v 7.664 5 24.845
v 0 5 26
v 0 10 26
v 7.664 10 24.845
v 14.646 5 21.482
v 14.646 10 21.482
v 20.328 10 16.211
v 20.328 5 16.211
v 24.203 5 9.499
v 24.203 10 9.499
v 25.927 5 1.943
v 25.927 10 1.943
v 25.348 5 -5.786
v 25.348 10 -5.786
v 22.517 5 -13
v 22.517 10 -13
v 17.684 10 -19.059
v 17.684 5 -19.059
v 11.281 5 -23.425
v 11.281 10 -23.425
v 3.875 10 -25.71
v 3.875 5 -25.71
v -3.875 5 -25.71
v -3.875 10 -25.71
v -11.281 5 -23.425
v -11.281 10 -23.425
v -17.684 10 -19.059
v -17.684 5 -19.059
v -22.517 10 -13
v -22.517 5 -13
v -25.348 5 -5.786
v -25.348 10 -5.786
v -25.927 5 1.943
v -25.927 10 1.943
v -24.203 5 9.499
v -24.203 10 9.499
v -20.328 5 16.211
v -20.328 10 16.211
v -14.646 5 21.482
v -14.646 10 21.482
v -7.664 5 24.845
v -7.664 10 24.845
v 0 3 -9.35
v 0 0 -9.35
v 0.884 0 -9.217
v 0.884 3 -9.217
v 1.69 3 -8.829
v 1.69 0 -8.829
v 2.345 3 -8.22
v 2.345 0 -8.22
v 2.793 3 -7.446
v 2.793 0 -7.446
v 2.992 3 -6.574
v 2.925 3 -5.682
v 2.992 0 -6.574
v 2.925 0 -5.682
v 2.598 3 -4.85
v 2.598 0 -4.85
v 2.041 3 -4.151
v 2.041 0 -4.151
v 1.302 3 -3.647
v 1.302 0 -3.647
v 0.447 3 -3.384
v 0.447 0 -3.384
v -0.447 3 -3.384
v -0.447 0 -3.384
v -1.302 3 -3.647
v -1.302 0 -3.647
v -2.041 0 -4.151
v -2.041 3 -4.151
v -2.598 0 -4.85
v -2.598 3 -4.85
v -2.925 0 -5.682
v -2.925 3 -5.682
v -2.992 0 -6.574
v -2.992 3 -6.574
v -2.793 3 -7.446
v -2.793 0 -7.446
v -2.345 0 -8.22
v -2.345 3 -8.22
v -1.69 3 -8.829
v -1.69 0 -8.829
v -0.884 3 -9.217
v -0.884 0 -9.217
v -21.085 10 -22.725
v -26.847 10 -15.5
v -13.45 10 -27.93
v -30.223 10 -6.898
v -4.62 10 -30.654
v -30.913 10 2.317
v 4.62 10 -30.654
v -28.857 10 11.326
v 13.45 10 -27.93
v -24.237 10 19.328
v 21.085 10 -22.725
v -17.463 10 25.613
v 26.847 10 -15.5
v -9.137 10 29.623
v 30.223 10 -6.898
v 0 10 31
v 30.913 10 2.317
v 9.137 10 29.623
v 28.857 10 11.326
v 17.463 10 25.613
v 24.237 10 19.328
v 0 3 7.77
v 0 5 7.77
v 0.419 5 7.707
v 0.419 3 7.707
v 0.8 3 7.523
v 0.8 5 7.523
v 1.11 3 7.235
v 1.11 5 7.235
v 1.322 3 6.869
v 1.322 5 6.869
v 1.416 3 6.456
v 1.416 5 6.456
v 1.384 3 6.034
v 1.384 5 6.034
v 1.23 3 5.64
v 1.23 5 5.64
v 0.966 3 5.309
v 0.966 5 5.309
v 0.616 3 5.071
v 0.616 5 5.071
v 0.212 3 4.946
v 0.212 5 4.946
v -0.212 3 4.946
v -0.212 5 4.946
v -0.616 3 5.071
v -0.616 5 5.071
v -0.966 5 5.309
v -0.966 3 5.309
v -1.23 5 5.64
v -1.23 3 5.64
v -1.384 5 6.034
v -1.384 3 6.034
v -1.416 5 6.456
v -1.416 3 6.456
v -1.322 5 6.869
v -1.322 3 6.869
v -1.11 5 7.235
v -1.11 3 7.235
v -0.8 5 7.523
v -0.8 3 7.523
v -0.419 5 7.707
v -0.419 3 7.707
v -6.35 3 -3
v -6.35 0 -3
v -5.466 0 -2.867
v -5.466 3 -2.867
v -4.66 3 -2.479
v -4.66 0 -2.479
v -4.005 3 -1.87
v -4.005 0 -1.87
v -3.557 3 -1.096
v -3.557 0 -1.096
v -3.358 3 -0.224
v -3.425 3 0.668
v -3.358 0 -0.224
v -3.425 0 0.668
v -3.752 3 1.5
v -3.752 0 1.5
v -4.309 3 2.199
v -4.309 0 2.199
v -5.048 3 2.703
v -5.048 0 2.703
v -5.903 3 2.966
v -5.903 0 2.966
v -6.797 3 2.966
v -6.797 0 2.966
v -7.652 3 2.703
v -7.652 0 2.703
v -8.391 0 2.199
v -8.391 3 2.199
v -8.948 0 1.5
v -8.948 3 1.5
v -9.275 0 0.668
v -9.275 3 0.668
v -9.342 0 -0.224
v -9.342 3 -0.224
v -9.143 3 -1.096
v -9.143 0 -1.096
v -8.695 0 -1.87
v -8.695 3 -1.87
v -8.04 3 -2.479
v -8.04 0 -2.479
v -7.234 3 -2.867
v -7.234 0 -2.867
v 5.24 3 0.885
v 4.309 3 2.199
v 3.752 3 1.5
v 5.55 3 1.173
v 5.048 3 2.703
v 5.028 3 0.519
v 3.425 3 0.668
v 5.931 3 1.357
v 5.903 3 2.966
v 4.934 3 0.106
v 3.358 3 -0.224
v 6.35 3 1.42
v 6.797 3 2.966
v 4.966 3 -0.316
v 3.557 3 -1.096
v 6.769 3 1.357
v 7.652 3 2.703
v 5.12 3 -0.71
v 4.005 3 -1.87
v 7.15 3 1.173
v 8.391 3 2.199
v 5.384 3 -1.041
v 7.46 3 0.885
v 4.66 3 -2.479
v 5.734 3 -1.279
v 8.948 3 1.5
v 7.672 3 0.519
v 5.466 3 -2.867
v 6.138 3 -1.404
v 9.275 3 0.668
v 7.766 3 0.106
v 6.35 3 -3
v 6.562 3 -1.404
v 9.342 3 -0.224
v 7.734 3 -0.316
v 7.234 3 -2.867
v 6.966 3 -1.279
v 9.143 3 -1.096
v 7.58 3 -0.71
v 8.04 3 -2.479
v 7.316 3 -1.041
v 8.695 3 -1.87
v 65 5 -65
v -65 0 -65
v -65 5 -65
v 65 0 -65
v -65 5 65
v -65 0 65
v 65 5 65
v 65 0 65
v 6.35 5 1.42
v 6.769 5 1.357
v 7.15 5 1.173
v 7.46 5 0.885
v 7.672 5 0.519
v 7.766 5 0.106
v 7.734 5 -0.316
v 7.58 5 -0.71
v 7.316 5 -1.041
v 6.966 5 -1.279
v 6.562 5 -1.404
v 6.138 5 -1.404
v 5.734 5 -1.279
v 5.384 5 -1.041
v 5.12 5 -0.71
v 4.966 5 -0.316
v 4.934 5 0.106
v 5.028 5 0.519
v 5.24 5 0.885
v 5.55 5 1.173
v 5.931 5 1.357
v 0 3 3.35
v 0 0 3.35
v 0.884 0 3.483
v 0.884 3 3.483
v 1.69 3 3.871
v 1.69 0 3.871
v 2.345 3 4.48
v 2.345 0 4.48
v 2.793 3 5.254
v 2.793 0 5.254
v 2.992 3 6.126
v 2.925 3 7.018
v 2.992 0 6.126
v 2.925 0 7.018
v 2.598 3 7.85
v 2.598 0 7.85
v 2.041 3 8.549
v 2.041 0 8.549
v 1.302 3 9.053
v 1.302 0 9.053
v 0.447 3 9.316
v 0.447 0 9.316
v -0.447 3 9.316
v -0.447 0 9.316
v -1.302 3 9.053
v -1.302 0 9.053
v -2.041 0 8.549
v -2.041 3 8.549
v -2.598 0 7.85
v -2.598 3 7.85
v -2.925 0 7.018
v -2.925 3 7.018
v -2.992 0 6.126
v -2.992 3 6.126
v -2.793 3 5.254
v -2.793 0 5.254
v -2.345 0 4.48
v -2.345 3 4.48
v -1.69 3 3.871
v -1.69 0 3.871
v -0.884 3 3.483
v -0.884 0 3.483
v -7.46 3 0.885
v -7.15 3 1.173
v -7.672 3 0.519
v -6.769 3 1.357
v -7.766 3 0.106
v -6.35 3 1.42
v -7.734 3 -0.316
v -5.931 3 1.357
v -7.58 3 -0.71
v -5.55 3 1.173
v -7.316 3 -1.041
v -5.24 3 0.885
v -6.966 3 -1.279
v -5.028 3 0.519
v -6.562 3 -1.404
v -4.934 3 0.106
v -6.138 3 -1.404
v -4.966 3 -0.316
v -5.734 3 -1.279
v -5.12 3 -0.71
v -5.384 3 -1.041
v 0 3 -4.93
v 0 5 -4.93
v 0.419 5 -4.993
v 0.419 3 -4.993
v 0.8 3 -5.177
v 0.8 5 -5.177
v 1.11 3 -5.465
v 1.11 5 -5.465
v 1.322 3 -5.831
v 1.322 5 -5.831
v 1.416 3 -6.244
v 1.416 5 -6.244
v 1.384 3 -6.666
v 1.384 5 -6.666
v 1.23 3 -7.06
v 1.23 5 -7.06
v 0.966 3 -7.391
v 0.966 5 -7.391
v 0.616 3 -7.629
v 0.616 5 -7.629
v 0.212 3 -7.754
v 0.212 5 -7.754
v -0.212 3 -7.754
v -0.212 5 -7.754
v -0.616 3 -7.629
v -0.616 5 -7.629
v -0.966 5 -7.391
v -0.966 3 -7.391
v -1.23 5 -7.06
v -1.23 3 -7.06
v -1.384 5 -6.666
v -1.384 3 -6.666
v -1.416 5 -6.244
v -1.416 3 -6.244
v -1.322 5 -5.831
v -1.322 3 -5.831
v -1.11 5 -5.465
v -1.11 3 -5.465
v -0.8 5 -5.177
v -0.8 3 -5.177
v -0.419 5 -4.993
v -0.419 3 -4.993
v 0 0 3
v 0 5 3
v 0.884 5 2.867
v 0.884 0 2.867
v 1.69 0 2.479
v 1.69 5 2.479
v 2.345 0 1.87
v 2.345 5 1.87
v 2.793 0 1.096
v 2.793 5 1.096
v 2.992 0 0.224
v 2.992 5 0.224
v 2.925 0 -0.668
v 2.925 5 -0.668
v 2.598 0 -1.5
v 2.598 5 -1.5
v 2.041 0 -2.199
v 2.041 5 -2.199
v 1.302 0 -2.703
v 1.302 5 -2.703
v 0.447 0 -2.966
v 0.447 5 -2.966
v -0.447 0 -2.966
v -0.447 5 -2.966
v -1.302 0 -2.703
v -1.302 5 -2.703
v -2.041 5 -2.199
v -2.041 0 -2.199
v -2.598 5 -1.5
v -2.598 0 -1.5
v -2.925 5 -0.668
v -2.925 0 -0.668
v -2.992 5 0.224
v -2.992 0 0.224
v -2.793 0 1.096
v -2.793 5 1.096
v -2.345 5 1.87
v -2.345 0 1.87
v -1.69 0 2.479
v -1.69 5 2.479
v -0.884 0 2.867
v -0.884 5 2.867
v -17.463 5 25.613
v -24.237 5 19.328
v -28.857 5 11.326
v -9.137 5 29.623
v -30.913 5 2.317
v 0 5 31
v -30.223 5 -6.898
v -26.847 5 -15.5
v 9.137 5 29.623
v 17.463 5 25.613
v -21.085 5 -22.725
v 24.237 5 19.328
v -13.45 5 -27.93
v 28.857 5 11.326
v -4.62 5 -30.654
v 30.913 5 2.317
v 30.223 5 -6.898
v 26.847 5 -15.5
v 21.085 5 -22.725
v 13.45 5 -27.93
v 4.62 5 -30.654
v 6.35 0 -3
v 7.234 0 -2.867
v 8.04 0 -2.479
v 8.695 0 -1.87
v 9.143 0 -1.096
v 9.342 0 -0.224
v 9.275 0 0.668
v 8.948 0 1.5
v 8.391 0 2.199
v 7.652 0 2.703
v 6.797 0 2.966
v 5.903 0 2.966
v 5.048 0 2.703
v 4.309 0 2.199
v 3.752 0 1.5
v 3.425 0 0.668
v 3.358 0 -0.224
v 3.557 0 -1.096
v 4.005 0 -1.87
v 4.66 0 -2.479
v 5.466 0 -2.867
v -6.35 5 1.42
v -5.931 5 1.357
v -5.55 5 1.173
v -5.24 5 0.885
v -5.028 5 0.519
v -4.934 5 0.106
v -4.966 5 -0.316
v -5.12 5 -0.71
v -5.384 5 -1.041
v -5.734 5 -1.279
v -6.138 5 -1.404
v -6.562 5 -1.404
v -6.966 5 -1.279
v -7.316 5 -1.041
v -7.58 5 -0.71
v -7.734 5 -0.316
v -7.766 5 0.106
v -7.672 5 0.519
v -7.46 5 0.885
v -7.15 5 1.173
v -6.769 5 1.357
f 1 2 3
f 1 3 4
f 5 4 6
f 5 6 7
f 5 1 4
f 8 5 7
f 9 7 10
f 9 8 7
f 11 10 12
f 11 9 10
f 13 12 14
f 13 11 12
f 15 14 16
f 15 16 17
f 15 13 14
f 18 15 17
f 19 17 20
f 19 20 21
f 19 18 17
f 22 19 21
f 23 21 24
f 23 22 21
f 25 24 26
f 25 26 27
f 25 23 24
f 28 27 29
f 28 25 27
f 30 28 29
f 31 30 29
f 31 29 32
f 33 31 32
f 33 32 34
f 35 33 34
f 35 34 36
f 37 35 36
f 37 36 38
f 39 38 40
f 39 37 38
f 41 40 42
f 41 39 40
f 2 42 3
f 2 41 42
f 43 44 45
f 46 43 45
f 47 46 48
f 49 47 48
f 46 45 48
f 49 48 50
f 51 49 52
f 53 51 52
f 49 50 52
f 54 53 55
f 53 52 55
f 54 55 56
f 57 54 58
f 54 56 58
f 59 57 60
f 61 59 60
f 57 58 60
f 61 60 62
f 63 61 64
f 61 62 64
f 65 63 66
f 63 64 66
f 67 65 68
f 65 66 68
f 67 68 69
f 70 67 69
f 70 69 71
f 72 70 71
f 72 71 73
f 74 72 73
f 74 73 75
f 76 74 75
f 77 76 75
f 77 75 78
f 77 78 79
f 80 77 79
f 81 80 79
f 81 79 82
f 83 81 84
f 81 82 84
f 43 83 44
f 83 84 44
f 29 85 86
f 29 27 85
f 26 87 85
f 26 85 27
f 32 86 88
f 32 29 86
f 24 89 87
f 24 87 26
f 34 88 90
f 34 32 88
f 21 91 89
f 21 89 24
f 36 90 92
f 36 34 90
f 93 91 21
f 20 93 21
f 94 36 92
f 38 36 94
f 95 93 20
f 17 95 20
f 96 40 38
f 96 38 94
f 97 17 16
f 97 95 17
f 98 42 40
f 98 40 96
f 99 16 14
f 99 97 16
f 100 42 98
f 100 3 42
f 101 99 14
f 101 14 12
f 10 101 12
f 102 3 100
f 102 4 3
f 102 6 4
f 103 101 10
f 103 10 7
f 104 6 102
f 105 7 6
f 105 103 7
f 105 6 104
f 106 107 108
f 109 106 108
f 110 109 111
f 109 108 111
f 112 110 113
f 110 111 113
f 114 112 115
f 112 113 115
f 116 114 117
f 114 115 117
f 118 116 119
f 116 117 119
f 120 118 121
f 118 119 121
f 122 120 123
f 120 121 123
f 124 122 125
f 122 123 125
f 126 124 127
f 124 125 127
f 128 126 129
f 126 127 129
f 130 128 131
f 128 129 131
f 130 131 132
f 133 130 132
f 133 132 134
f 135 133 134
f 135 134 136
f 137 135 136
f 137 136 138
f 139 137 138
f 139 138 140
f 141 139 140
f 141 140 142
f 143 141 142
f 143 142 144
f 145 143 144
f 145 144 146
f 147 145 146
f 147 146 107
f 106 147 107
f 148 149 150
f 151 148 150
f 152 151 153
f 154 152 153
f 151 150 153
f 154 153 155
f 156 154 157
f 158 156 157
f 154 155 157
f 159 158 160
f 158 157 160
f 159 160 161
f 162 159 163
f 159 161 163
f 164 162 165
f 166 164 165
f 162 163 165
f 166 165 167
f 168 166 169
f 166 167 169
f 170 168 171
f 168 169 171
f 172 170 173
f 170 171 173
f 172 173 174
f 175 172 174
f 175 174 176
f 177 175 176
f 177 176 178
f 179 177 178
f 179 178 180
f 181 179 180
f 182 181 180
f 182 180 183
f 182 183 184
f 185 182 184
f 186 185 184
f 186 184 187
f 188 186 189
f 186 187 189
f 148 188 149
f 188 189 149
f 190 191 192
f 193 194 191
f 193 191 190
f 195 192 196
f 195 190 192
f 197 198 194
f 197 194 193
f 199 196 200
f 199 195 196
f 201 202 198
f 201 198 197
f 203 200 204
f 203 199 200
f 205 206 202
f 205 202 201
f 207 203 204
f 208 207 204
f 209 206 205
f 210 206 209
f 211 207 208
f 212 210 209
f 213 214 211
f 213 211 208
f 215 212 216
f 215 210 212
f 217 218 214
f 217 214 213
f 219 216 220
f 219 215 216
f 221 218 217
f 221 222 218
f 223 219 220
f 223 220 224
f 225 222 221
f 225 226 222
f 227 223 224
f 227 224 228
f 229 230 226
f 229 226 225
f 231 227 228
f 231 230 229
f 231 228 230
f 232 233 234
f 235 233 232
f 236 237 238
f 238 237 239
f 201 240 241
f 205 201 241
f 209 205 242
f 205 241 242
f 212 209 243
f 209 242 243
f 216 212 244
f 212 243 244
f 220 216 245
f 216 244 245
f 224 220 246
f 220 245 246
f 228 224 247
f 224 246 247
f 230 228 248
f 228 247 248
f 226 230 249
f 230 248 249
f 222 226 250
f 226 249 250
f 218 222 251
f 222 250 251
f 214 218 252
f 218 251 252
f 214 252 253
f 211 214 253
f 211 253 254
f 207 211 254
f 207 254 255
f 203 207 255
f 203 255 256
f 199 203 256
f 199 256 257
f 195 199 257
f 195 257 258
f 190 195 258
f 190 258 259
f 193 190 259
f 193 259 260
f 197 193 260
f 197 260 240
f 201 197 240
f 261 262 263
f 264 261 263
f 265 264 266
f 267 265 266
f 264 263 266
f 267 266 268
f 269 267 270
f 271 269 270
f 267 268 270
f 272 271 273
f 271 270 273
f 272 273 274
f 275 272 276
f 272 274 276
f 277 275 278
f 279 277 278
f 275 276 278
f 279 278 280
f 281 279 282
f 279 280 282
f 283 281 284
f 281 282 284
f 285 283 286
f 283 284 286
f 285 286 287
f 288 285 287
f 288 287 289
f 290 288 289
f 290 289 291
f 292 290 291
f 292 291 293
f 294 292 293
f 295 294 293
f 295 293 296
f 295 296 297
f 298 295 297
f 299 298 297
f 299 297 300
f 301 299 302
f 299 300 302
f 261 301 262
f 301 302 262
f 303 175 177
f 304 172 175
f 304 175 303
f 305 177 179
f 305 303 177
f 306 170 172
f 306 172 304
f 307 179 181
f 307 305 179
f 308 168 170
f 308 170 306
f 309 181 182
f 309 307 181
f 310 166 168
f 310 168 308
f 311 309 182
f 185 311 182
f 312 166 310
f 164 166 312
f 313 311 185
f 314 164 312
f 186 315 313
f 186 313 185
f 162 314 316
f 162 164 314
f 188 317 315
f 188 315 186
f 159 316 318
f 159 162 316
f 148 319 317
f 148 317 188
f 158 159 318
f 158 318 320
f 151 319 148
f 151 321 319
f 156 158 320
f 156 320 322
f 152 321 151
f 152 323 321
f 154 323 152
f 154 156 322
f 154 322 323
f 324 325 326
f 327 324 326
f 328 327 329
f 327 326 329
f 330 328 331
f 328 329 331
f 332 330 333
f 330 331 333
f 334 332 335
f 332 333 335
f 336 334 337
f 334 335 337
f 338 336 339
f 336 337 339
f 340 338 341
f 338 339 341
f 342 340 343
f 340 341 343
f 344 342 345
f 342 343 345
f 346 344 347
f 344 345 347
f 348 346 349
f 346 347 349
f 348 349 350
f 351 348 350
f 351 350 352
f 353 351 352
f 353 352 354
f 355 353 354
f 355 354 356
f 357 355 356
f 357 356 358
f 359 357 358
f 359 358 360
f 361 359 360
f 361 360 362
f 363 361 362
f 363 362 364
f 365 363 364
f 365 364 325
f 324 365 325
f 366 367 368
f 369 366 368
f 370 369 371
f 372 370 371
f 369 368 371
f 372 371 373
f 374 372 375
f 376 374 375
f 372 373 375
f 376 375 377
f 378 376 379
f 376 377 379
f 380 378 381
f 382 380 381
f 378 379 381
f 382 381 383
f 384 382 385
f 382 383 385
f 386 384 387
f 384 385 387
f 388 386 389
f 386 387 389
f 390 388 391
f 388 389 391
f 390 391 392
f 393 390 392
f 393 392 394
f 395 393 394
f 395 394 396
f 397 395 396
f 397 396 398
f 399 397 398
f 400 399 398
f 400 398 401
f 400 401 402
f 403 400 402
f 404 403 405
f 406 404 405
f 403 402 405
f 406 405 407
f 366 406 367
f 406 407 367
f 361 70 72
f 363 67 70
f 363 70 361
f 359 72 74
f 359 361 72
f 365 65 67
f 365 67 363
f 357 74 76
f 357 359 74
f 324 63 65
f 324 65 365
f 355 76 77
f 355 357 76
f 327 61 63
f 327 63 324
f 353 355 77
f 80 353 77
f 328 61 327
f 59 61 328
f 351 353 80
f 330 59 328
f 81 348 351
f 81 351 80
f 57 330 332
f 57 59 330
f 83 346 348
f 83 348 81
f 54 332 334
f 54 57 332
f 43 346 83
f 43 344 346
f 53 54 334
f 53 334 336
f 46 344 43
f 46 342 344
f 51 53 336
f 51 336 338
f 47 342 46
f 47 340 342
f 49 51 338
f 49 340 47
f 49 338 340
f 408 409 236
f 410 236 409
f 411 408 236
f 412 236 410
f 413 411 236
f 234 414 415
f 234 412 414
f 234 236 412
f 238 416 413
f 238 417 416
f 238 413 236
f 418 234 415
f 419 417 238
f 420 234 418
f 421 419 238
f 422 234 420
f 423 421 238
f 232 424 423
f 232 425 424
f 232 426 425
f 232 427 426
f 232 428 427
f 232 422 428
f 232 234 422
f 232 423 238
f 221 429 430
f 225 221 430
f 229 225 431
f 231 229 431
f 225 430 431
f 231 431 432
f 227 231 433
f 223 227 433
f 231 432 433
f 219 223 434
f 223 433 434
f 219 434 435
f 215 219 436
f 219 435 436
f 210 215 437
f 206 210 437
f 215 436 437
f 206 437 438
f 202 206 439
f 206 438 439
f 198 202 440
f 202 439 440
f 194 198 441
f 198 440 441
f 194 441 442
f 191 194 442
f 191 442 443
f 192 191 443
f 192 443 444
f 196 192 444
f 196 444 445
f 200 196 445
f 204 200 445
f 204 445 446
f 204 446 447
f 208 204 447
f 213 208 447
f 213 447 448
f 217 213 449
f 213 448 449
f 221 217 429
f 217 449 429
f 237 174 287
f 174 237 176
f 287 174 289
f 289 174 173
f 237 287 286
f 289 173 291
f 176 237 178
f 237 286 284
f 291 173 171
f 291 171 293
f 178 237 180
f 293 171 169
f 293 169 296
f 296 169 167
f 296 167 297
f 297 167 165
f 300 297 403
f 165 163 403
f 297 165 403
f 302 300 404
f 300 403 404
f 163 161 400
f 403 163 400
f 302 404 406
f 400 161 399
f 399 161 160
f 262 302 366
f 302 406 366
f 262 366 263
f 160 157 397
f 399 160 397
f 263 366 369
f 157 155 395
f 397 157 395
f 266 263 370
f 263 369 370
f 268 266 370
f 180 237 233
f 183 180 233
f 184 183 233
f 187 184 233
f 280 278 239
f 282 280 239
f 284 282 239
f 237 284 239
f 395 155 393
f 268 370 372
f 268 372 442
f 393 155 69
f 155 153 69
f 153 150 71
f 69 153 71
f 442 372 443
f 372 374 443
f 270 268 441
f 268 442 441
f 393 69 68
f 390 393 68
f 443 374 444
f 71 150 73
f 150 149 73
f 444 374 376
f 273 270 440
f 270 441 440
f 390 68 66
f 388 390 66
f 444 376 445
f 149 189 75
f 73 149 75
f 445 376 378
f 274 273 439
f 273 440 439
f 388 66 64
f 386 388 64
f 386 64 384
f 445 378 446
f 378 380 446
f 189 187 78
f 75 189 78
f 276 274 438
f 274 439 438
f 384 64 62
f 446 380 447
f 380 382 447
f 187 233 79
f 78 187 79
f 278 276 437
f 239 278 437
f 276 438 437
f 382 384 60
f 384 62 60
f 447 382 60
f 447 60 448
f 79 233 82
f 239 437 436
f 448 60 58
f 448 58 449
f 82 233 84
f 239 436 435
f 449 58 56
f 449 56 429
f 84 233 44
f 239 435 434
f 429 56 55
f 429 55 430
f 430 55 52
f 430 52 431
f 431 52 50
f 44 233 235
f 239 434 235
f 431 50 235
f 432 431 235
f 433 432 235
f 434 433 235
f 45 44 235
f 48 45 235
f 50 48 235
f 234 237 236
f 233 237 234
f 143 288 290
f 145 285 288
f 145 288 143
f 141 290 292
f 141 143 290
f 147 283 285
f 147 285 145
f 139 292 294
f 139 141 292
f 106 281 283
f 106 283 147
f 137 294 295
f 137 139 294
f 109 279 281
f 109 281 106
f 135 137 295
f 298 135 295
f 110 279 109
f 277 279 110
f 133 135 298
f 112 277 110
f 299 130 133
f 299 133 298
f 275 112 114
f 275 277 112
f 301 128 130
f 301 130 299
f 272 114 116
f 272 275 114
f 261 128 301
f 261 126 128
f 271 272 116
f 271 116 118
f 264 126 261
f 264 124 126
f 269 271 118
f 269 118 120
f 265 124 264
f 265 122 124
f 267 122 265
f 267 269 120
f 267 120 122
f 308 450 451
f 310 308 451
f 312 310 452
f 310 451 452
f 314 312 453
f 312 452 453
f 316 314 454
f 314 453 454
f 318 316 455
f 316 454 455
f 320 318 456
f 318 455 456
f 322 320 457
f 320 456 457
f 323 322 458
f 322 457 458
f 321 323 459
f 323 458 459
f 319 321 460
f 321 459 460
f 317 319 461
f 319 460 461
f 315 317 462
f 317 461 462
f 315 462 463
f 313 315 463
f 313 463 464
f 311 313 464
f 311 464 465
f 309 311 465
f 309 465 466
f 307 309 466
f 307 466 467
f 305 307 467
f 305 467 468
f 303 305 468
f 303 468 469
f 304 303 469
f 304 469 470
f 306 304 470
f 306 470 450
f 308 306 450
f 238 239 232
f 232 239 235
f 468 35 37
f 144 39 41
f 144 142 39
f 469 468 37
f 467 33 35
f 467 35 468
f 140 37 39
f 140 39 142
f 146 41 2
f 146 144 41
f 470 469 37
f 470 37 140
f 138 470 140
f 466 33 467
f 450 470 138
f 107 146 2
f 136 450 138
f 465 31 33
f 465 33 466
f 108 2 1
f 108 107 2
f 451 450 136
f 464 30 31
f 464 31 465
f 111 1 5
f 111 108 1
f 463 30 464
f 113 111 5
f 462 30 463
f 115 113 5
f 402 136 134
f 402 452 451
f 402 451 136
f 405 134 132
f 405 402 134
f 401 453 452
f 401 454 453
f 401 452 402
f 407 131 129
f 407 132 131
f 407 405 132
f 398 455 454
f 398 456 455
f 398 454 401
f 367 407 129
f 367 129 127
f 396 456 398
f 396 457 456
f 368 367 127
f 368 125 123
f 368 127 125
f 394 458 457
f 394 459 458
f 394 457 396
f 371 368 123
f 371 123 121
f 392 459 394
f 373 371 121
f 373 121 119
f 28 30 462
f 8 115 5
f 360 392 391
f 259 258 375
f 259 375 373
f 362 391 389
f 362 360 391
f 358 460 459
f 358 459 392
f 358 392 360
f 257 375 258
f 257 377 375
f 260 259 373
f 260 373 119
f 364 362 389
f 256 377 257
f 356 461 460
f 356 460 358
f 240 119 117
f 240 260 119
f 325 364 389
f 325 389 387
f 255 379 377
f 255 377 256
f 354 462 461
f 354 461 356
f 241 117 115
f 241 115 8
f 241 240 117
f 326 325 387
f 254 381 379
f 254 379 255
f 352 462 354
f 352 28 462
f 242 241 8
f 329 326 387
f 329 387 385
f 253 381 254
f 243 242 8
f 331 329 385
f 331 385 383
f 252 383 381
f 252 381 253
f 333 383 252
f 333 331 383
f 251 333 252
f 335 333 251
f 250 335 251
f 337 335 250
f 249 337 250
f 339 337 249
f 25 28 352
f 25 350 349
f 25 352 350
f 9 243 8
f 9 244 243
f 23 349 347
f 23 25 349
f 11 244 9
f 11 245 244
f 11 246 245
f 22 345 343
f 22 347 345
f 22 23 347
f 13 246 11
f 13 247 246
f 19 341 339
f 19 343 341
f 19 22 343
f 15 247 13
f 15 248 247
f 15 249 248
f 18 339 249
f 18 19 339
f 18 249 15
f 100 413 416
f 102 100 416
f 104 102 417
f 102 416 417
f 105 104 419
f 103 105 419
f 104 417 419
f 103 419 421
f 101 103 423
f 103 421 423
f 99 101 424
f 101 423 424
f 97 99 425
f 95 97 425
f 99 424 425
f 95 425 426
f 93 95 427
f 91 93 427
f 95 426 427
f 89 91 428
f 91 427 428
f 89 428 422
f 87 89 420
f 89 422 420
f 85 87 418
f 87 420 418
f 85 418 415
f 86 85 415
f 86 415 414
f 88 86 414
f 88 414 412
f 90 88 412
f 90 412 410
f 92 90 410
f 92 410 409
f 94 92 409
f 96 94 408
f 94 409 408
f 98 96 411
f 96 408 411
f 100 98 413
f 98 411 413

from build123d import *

# Parameters (mm, degrees)
SKETCH1_W           = 130
SKETCH1_H           = 130
SKETCH1_R           = 31
SKETCH1_R_2         = 26
SKETCH1_R_3         = 24
BOSS_EXTRUDE2_DEPTH = 5
SKETCH2_R           = 31
SKETCH2_R_2         = 26
BOSS_EXTRUDE3_DEPTH = 5
SKETCH3_R           = 1.42
SKETCH3_R_2         = 3
CUT_EXTRUDE1_DEPTH  = 5
SKETCH4_R           = 3
CUT_EXTRUDE2_DEPTH  = 3


with BuildPart() as part:
    # Sketch1 → Boss-Extrude2 (new body)
    # profile 1 of 4: a face of its own
    with BuildSketch(Plane(origin=(0, 0, 0), x_dir=(1, 0, 0), z_dir=(0, 1, 0))):
        Rectangle(SKETCH1_W, SKETCH1_H)
        Circle(SKETCH1_R, mode=Mode.SUBTRACT)
    # profile 2 of 4: a face of its own
    with BuildSketch(Plane(origin=(0, 0, 0), x_dir=(1, 0, 0), z_dir=(0, 1, 0))):
        Circle(SKETCH1_R)
        Circle(SKETCH1_R_2, mode=Mode.SUBTRACT)
    # profile 3 of 4: a face of its own
    with BuildSketch(Plane(origin=(0, 0, 0), x_dir=(1, 0, 0), z_dir=(0, 1, 0))):
        Circle(SKETCH1_R_2)
        Circle(SKETCH1_R_3, mode=Mode.SUBTRACT)
    # profile 4 of 4: a face of its own
    with BuildSketch(Plane(origin=(0, 0, 0), x_dir=(1, 0, 0), z_dir=(0, 1, 0))):
        Circle(SKETCH1_R_3)
    extrude(amount=BOSS_EXTRUDE2_DEPTH)

    # Sketch2 → Boss-Extrude3 (add)
    with BuildSketch(Plane(origin=(0, 5, 0), x_dir=(1, 0, 0), z_dir=(0, 1, 0))):
        with Locations(Location((0, 0, 0), (0, 0, 270))):
            Circle(SKETCH2_R)
        with Locations(Location((0, 0, 0), (0, 0, 270))):
            Circle(SKETCH2_R_2, mode=Mode.SUBTRACT)
    extrude(amount=BOSS_EXTRUDE3_DEPTH)

    # Sketch3 → Cut-Extrude1 (cut)
    with BuildSketch(Plane(origin=(0, 5, 0), x_dir=(1, 0, 0), z_dir=(0, 1, 0))):
        with Locations(Location((0, 6.35, 0), (0, 0, 270))):
            Circle(SKETCH3_R)
        with Locations(Location((6.35, 0, 0), (0, 0, 270))):
            Circle(SKETCH3_R)
        with Locations(Location((0, -6.35, 0), (0, 0, 270))):
            Circle(SKETCH3_R)
        with Locations(Location((-6.35, 0, 0), (0, 0, 270))):
            Circle(SKETCH3_R)
        with Locations(Location((0, 0, 0), (0, 0, 270))):
            Circle(SKETCH3_R_2)
    extrude(amount=-CUT_EXTRUDE1_DEPTH, mode=Mode.SUBTRACT)

    # Sketch4 → Cut-Extrude2 (cut)
    with BuildSketch(Plane(origin=(0, 0, 0), x_dir=(-1, 0, 0), z_dir=(0, -1, 0))):
        with Locations(Location((-6.35, 0, 0), (0, 0, 90))):
            Circle(SKETCH4_R)
        with Locations(Location((0, 6.35, 0), (0, 0, 90))):
            Circle(SKETCH4_R)
        with Locations(Location((6.35, 0, 0), (0, 0, 90))):
            Circle(SKETCH4_R)
        with Locations(Location((0, -6.35, 0), (0, 0, 90))):
            Circle(SKETCH4_R)
    extrude(amount=-CUT_EXTRUDE2_DEPTH, mode=Mode.SUBTRACT)


solid = part.part
